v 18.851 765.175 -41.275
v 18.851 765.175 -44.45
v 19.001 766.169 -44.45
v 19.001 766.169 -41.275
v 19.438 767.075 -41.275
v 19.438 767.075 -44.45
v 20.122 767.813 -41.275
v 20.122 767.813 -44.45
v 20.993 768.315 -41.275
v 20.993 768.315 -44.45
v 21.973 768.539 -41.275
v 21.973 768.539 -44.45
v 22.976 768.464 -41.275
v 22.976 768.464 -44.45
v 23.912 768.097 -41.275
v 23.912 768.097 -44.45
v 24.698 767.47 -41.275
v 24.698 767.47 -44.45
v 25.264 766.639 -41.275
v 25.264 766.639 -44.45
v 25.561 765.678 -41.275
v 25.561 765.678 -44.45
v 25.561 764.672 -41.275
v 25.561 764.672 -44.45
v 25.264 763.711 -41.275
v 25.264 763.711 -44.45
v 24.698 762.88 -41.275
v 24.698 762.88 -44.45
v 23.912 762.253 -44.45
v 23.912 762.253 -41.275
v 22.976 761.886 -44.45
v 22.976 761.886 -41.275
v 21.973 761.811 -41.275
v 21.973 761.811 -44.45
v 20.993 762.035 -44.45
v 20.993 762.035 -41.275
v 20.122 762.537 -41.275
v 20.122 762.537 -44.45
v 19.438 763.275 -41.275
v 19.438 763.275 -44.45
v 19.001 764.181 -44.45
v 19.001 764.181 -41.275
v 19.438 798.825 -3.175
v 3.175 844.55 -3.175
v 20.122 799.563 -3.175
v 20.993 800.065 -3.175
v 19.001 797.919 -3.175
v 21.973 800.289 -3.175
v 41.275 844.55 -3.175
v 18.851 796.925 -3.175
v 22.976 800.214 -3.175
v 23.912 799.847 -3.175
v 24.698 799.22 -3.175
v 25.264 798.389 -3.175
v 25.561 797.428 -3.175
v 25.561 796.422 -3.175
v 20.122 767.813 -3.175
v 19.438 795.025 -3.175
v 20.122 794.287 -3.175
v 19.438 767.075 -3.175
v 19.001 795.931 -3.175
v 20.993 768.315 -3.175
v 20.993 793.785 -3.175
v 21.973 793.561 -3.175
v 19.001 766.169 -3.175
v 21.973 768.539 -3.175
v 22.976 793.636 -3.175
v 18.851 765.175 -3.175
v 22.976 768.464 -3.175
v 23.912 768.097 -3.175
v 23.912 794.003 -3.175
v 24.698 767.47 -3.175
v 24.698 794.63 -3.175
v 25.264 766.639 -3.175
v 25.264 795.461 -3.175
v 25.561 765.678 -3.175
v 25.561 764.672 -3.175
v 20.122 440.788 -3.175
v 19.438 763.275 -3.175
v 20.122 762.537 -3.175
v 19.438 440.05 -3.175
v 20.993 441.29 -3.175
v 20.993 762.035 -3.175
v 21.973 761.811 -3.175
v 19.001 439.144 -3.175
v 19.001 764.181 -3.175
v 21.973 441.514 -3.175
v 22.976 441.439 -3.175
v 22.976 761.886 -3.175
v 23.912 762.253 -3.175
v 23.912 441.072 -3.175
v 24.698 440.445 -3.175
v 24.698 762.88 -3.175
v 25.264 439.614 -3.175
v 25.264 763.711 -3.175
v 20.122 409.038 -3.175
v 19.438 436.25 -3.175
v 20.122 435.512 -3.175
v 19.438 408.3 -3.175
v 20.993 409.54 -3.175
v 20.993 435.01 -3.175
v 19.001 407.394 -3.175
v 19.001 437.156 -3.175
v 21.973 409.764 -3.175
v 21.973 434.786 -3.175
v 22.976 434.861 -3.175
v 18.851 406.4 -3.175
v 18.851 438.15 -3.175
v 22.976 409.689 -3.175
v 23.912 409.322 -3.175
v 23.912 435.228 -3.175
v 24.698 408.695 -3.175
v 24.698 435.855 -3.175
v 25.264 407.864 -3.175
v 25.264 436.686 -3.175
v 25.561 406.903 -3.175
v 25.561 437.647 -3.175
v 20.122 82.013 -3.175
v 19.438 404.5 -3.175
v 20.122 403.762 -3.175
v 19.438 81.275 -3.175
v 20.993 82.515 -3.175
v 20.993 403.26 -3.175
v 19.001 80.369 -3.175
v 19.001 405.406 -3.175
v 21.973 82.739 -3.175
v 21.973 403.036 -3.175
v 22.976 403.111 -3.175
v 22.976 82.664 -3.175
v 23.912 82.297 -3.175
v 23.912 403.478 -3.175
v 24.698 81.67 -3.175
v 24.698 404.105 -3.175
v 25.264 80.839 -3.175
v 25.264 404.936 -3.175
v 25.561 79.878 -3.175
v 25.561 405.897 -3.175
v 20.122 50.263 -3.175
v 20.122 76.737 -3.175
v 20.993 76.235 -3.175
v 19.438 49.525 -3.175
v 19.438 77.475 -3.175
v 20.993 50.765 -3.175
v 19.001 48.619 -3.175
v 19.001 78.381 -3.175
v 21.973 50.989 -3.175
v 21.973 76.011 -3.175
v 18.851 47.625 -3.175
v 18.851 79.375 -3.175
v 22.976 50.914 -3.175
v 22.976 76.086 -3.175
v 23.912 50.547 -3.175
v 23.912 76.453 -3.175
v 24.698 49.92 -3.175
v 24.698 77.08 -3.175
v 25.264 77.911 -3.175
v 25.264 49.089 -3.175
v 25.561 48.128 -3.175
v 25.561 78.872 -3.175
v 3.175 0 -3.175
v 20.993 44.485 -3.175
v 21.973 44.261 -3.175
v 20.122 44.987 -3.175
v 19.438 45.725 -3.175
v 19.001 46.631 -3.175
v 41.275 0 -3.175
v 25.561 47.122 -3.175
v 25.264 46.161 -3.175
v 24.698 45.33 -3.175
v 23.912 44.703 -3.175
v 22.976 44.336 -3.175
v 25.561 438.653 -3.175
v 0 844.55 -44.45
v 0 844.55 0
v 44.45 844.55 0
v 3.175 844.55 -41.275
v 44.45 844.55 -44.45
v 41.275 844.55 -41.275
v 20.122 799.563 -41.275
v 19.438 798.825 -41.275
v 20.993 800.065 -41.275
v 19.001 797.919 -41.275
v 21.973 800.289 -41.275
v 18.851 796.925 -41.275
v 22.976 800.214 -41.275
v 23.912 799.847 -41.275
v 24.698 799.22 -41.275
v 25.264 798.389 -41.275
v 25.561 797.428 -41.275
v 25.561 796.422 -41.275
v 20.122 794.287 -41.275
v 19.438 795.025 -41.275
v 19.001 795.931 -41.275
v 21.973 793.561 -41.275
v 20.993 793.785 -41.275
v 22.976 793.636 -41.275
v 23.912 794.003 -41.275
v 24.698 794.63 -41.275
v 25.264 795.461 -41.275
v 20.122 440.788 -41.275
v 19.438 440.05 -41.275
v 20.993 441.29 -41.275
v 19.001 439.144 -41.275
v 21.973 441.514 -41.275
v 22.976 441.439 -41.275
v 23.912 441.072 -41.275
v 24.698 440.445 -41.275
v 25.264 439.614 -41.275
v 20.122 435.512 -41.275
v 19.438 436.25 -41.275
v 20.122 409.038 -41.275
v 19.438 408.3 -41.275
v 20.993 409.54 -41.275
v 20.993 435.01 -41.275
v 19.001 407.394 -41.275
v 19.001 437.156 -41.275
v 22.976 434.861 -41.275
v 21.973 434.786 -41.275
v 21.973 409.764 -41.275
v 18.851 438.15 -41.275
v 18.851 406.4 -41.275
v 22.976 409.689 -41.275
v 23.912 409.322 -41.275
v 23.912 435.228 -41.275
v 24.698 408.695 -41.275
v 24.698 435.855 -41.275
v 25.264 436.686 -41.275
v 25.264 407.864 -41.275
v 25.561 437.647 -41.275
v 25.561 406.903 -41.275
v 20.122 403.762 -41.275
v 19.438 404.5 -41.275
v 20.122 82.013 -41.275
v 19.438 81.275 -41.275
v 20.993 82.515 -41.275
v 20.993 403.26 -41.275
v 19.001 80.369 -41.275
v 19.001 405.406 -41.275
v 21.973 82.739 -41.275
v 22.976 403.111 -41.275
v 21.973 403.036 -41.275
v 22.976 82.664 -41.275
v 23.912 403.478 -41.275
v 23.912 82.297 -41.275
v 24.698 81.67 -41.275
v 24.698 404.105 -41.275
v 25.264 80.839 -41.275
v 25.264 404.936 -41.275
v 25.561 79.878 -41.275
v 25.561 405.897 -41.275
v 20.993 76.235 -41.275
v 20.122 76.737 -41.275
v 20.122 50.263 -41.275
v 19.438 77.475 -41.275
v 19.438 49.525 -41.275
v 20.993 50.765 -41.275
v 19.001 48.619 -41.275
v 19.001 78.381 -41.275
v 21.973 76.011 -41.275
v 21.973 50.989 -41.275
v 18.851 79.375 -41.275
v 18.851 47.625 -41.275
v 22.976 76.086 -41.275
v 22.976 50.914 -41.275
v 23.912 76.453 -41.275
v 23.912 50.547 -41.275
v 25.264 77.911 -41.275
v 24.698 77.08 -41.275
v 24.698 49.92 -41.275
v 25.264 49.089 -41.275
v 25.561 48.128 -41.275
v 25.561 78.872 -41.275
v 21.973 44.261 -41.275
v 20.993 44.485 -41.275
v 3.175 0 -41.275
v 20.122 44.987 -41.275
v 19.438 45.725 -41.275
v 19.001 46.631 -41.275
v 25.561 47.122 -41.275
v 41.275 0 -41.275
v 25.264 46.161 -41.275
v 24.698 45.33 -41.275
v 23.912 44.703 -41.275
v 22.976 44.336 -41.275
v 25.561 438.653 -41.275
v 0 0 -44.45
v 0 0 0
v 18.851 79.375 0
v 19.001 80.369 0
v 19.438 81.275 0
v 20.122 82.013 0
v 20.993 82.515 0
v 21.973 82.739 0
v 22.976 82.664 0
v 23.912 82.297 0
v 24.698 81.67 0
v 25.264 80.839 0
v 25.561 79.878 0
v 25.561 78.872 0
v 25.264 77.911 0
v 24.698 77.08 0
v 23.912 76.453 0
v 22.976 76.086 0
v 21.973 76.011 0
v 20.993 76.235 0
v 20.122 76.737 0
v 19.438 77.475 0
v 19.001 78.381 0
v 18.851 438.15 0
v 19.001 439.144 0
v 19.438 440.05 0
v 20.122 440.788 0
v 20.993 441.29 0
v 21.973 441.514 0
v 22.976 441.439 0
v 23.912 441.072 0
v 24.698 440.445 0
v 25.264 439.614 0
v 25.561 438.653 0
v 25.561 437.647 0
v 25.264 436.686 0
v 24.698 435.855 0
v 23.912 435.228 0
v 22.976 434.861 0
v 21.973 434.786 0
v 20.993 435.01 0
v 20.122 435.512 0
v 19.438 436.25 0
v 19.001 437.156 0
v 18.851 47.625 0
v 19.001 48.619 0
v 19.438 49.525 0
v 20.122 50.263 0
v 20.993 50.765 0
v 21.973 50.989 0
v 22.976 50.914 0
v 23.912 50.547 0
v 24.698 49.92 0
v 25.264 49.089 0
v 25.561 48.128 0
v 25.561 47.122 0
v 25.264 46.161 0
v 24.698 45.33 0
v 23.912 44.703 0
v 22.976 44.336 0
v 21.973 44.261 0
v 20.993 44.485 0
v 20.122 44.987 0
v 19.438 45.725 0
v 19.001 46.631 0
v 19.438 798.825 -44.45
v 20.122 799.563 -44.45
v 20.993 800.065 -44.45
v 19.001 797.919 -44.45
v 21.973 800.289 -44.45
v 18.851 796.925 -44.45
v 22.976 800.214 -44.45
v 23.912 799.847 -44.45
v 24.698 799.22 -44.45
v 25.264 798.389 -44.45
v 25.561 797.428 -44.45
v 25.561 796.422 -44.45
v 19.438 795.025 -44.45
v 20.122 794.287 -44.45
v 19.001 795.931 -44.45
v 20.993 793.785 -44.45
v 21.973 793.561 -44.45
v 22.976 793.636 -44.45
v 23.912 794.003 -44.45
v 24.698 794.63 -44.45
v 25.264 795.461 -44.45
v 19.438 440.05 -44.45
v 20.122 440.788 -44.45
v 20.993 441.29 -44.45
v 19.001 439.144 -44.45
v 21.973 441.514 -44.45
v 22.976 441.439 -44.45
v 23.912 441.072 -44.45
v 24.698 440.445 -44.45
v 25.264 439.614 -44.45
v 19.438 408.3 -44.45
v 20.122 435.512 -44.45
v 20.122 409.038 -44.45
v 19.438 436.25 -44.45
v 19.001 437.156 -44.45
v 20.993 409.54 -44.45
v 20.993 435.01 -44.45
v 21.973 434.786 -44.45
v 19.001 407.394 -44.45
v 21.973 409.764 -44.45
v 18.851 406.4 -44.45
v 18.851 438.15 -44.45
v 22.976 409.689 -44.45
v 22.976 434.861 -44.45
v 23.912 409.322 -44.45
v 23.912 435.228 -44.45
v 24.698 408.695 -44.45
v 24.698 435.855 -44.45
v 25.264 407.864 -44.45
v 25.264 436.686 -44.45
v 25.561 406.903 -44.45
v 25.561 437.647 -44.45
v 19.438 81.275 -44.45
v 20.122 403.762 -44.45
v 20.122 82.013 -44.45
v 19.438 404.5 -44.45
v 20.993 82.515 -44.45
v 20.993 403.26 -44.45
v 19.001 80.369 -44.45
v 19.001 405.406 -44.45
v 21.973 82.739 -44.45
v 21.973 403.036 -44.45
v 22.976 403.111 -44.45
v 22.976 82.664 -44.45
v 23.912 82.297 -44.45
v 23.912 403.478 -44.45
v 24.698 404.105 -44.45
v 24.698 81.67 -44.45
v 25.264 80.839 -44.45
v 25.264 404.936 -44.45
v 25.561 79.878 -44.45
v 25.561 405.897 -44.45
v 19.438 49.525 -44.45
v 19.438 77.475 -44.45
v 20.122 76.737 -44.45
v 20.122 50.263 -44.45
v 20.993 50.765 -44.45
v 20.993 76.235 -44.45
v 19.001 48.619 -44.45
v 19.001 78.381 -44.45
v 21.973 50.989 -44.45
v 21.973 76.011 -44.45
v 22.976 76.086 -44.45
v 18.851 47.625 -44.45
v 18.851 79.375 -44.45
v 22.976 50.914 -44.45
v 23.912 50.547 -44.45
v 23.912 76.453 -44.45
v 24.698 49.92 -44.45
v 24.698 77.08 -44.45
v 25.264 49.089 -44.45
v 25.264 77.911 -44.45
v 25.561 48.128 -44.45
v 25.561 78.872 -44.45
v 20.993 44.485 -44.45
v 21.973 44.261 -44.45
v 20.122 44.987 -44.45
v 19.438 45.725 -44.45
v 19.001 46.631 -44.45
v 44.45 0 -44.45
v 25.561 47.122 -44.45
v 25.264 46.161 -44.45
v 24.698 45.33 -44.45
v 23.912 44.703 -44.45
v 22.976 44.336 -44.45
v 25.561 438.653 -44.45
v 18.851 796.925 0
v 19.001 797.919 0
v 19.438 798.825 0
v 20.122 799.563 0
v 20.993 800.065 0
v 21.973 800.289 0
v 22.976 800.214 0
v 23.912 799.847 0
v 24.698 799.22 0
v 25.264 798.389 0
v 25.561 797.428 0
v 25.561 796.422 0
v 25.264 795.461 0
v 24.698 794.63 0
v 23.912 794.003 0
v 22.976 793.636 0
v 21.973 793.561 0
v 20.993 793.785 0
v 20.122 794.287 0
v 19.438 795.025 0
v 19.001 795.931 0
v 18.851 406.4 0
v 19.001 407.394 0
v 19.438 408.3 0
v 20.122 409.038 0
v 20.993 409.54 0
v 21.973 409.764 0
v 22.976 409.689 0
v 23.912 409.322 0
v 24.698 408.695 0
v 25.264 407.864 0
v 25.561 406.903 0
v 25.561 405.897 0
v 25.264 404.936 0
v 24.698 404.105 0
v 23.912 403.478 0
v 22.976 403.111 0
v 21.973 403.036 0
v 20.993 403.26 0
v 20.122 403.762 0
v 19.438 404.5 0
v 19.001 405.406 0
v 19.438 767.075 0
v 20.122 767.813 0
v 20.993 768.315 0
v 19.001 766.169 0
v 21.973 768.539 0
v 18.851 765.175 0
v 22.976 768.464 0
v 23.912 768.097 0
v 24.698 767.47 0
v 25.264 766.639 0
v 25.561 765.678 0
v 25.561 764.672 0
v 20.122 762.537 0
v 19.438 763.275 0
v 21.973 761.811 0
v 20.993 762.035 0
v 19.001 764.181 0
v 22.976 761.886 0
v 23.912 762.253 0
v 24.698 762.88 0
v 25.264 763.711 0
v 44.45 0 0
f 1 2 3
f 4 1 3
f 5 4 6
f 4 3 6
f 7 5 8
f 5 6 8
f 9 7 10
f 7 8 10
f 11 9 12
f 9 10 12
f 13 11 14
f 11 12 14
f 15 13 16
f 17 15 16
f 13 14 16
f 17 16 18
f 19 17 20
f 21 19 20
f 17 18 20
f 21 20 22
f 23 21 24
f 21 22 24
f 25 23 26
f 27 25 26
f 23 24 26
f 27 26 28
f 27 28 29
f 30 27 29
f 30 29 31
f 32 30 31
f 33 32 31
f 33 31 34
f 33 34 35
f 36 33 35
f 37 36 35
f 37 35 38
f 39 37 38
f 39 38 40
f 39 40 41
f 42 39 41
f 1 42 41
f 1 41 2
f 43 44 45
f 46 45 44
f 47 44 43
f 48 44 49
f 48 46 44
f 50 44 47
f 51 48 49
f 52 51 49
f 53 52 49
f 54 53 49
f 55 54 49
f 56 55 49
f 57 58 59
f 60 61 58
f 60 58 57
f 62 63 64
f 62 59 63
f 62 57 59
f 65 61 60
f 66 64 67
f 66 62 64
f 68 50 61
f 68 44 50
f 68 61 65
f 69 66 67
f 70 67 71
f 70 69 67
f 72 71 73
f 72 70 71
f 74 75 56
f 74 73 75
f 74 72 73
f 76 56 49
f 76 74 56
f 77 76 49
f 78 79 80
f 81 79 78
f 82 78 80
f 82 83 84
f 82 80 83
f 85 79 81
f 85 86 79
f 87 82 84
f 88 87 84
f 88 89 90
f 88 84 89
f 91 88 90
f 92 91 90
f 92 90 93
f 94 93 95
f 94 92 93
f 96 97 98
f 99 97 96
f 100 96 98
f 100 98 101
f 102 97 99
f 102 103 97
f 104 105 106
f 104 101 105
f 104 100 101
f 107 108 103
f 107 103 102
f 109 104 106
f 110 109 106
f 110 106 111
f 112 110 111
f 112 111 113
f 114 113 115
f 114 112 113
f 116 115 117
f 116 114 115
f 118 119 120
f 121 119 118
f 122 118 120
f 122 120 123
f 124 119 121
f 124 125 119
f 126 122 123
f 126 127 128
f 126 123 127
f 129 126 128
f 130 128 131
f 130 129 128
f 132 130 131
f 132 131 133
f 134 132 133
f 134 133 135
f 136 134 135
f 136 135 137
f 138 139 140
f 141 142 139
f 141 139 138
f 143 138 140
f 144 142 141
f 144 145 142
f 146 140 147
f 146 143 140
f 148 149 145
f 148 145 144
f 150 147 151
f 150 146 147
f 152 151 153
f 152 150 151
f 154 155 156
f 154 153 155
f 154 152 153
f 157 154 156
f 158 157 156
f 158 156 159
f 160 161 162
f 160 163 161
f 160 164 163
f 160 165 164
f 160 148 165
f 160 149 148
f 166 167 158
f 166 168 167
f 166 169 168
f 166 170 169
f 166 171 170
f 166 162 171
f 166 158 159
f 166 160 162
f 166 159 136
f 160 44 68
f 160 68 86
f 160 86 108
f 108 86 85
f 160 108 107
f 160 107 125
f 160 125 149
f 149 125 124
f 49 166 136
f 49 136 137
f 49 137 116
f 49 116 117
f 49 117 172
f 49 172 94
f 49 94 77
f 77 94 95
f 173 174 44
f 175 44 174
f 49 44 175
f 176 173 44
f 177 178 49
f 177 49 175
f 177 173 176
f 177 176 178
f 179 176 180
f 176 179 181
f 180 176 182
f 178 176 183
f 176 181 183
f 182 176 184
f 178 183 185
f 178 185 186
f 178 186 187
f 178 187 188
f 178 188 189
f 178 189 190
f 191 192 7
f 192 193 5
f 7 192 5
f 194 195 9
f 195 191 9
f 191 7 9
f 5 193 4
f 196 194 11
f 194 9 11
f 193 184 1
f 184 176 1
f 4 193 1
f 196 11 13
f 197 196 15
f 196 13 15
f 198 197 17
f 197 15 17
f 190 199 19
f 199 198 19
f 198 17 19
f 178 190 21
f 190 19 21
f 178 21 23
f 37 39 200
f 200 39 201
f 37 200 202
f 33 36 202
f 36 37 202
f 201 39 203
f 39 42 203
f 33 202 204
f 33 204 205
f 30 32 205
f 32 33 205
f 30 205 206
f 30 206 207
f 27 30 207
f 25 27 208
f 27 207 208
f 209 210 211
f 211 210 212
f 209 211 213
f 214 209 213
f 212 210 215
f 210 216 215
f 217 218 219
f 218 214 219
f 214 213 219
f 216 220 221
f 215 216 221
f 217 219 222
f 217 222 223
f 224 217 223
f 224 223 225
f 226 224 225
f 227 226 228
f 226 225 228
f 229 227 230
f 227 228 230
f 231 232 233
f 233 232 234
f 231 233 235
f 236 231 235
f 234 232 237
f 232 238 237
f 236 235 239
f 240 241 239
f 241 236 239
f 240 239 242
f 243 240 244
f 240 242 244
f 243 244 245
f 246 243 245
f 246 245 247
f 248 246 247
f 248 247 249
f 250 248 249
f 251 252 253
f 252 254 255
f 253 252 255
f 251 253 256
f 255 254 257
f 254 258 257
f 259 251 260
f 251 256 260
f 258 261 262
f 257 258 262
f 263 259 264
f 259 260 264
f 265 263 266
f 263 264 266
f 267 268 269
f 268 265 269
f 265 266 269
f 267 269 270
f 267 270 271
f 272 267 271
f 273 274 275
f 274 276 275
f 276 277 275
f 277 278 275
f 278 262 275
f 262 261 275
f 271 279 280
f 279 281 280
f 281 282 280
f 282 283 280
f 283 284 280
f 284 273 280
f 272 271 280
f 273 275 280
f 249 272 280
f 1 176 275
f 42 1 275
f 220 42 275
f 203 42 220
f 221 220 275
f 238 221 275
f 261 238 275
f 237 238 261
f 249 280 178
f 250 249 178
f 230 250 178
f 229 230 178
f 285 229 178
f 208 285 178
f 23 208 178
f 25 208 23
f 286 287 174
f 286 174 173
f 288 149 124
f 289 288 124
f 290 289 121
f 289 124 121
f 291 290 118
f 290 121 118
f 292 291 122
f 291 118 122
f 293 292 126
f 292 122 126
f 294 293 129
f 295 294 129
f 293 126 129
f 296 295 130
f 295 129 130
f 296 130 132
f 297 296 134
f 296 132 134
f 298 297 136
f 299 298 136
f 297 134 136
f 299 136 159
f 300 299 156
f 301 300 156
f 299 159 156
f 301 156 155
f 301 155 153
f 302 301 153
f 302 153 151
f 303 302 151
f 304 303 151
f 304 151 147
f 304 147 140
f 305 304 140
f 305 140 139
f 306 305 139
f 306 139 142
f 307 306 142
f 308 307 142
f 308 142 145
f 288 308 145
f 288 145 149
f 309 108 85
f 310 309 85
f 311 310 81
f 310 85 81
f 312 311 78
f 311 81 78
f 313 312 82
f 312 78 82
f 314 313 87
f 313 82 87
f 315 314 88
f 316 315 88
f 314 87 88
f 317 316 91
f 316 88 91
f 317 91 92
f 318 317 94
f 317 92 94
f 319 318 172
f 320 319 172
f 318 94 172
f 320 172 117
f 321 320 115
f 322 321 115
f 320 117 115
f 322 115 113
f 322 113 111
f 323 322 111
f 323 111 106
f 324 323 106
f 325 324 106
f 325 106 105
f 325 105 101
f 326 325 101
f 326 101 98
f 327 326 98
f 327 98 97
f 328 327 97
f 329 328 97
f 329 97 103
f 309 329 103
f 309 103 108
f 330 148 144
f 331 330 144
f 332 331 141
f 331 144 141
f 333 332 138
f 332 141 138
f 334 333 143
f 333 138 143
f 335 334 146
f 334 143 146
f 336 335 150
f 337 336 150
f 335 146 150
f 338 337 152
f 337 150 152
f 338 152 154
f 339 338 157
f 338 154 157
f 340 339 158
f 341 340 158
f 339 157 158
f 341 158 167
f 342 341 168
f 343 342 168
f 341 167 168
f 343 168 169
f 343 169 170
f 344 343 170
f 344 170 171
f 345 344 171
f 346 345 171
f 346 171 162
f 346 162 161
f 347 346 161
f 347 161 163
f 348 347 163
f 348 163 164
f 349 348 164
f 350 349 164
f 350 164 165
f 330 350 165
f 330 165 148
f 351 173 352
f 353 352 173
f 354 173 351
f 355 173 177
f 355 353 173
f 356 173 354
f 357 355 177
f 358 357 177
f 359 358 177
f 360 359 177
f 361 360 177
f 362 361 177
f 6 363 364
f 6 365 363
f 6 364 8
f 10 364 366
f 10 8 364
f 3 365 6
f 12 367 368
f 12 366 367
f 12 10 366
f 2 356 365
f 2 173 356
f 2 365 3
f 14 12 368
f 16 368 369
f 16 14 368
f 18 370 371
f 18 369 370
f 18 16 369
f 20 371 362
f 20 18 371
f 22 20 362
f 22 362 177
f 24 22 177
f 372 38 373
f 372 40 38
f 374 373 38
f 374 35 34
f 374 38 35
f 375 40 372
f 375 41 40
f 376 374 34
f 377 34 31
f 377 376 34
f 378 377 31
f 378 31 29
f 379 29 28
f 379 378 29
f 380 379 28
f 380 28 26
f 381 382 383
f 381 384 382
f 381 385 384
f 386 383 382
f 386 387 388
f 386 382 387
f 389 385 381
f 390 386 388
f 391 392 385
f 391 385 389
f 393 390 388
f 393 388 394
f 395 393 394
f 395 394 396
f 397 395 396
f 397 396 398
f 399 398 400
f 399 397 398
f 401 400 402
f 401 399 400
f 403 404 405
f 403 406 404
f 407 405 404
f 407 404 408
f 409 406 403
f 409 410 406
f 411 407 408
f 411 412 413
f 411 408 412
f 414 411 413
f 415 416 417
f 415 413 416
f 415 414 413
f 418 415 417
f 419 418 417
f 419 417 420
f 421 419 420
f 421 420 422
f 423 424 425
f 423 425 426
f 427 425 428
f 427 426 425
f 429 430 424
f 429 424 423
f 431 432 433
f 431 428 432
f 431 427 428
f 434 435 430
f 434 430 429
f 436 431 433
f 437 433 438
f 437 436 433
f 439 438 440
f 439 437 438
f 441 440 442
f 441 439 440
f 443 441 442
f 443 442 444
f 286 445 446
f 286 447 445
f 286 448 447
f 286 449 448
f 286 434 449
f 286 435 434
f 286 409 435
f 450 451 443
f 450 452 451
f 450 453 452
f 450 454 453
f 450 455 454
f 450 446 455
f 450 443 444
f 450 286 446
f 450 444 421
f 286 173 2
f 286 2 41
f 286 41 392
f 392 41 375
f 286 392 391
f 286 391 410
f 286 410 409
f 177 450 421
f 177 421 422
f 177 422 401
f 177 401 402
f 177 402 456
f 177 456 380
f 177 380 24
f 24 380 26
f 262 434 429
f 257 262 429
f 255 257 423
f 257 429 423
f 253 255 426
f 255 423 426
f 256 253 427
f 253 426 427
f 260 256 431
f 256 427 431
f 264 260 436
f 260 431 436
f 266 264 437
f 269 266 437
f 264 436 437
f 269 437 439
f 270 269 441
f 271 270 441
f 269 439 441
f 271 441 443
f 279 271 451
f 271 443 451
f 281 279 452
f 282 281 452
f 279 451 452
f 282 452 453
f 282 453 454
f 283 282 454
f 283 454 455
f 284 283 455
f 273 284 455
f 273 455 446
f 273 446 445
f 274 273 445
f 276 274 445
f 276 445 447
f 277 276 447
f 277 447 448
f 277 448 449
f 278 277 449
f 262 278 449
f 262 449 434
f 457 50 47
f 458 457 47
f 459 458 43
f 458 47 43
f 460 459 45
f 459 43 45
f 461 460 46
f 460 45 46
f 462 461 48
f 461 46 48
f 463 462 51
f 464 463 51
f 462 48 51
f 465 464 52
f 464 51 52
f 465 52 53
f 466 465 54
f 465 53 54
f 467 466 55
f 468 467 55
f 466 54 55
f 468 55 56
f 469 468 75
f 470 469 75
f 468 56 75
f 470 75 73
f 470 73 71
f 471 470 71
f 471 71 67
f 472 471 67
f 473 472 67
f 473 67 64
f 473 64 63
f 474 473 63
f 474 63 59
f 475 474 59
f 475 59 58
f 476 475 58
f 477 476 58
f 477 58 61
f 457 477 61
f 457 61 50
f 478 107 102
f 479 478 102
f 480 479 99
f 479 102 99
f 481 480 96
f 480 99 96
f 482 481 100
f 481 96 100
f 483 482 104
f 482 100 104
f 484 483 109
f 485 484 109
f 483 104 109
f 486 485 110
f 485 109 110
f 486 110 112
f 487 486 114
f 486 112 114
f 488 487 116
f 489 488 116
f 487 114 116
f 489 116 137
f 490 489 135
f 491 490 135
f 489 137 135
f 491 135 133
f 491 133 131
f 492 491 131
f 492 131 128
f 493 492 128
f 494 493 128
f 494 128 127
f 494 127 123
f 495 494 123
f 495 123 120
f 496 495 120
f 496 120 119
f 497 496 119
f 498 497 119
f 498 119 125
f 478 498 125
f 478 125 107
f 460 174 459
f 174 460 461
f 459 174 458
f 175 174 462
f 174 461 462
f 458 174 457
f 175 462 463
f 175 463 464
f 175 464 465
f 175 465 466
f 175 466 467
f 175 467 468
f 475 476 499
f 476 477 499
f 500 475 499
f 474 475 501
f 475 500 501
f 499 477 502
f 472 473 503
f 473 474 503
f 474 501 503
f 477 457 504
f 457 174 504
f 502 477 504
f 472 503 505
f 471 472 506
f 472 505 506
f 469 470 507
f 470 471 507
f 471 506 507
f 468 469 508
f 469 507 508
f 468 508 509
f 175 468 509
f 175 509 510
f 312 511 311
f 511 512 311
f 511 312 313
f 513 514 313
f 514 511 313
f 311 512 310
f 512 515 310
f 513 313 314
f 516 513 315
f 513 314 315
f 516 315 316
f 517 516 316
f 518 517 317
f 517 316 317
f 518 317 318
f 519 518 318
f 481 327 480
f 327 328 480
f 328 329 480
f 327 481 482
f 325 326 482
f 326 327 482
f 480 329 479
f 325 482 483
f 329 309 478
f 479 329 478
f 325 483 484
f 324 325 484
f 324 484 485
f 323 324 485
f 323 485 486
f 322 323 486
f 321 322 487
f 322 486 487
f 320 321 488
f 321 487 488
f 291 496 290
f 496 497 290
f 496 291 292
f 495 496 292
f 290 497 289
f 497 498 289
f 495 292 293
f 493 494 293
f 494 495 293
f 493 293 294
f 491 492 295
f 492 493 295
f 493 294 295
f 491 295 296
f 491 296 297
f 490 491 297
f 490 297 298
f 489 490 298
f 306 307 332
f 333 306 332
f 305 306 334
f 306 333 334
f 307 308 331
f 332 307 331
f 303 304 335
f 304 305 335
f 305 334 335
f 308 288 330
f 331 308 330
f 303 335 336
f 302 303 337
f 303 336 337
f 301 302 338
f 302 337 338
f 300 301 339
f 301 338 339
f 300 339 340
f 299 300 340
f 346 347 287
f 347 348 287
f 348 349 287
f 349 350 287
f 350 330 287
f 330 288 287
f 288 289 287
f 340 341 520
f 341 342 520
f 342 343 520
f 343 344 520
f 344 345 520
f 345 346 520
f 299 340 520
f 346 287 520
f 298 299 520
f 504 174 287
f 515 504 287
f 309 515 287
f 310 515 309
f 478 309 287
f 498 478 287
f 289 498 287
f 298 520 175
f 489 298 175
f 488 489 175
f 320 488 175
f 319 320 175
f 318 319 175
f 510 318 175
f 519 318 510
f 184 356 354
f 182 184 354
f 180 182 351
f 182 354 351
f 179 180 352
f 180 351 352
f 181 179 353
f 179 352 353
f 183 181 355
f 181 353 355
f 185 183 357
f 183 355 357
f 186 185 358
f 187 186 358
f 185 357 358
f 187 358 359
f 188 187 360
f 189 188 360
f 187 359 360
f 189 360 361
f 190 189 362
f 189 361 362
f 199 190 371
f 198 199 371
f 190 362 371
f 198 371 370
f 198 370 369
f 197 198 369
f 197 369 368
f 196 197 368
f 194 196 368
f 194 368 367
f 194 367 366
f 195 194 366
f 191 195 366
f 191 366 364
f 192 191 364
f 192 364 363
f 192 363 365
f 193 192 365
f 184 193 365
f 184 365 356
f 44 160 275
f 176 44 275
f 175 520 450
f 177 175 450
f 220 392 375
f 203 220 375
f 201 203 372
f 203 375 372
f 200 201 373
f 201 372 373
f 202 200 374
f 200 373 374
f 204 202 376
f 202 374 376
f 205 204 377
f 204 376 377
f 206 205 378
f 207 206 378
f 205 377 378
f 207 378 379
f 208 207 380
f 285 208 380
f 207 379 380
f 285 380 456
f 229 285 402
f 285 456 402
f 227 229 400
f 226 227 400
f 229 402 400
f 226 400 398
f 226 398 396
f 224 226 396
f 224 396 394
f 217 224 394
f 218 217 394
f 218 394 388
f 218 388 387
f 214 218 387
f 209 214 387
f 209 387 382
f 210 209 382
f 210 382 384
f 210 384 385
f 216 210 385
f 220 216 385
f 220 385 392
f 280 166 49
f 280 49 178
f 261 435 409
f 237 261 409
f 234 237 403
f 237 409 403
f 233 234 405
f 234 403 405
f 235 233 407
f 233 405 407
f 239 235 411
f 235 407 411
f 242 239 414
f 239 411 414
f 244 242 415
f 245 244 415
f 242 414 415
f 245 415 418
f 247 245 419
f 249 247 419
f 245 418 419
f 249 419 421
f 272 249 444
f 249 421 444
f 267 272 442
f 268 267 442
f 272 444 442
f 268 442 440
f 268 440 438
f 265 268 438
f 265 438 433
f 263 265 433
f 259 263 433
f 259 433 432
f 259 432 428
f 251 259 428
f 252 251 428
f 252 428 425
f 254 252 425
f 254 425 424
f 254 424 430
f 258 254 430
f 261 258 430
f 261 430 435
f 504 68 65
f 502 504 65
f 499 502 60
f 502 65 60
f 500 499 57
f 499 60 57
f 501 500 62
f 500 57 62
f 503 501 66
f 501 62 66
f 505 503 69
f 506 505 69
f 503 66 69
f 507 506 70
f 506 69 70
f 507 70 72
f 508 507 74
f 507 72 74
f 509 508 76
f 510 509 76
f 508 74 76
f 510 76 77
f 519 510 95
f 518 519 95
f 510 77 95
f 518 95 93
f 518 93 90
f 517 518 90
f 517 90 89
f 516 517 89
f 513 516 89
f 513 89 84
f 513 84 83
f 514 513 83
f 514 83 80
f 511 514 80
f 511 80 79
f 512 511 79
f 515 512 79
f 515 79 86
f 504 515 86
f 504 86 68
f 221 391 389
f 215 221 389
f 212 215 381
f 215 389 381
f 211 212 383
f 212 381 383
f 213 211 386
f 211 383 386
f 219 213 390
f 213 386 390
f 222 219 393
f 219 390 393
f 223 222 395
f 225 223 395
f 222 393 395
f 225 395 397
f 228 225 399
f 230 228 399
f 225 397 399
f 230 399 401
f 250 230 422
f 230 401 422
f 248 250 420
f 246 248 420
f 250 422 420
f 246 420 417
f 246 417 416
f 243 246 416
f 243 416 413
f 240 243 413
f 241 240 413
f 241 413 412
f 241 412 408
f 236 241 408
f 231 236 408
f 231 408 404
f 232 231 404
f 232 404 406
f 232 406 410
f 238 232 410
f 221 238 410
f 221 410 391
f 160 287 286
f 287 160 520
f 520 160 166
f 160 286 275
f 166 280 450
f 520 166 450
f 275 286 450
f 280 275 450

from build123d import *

# Parameters (mm, degrees)
SKETCH1_W                        = 44.45
SKETCH1_H                        = 44.45
SKETCH1_W_2                      = 38.1
SKETCH1_H_2                      = 38.1
BOSS_EXTRUDE1_DEPTH              = 844.55
F_17_64_0_26563_DIAMETER_HOLE1_D = 6.747002


with BuildPart() as part:
    # Sketch1 → Boss-Extrude1 (new body)
    with BuildSketch(Plane(origin=(0, 0, 0), x_dir=(1, 0, 0), z_dir=(0, 1, 0))):
        with Locations((22.225, 22.225)):
            Rectangle(SKETCH1_W, SKETCH1_H)
        with Locations((22.225, 22.225)):
            Rectangle(SKETCH1_W_2, SKETCH1_H_2, mode=Mode.SUBTRACT)
    extrude(amount=BOSS_EXTRUDE1_DEPTH)

    # 17/64 (0.26563) Diameter Hole1 (through all)
    with Locations(Plane.XY):
        with Locations((22.225, 796.925), (22.225, 765.175), (22.225, 438.15), (22.225, 406.4), (22.225, 79.375), (22.225, 47.625)):
            Hole(F_17_64_0_26563_DIAMETER_HOLE1_D / 2)


solid = part.part
